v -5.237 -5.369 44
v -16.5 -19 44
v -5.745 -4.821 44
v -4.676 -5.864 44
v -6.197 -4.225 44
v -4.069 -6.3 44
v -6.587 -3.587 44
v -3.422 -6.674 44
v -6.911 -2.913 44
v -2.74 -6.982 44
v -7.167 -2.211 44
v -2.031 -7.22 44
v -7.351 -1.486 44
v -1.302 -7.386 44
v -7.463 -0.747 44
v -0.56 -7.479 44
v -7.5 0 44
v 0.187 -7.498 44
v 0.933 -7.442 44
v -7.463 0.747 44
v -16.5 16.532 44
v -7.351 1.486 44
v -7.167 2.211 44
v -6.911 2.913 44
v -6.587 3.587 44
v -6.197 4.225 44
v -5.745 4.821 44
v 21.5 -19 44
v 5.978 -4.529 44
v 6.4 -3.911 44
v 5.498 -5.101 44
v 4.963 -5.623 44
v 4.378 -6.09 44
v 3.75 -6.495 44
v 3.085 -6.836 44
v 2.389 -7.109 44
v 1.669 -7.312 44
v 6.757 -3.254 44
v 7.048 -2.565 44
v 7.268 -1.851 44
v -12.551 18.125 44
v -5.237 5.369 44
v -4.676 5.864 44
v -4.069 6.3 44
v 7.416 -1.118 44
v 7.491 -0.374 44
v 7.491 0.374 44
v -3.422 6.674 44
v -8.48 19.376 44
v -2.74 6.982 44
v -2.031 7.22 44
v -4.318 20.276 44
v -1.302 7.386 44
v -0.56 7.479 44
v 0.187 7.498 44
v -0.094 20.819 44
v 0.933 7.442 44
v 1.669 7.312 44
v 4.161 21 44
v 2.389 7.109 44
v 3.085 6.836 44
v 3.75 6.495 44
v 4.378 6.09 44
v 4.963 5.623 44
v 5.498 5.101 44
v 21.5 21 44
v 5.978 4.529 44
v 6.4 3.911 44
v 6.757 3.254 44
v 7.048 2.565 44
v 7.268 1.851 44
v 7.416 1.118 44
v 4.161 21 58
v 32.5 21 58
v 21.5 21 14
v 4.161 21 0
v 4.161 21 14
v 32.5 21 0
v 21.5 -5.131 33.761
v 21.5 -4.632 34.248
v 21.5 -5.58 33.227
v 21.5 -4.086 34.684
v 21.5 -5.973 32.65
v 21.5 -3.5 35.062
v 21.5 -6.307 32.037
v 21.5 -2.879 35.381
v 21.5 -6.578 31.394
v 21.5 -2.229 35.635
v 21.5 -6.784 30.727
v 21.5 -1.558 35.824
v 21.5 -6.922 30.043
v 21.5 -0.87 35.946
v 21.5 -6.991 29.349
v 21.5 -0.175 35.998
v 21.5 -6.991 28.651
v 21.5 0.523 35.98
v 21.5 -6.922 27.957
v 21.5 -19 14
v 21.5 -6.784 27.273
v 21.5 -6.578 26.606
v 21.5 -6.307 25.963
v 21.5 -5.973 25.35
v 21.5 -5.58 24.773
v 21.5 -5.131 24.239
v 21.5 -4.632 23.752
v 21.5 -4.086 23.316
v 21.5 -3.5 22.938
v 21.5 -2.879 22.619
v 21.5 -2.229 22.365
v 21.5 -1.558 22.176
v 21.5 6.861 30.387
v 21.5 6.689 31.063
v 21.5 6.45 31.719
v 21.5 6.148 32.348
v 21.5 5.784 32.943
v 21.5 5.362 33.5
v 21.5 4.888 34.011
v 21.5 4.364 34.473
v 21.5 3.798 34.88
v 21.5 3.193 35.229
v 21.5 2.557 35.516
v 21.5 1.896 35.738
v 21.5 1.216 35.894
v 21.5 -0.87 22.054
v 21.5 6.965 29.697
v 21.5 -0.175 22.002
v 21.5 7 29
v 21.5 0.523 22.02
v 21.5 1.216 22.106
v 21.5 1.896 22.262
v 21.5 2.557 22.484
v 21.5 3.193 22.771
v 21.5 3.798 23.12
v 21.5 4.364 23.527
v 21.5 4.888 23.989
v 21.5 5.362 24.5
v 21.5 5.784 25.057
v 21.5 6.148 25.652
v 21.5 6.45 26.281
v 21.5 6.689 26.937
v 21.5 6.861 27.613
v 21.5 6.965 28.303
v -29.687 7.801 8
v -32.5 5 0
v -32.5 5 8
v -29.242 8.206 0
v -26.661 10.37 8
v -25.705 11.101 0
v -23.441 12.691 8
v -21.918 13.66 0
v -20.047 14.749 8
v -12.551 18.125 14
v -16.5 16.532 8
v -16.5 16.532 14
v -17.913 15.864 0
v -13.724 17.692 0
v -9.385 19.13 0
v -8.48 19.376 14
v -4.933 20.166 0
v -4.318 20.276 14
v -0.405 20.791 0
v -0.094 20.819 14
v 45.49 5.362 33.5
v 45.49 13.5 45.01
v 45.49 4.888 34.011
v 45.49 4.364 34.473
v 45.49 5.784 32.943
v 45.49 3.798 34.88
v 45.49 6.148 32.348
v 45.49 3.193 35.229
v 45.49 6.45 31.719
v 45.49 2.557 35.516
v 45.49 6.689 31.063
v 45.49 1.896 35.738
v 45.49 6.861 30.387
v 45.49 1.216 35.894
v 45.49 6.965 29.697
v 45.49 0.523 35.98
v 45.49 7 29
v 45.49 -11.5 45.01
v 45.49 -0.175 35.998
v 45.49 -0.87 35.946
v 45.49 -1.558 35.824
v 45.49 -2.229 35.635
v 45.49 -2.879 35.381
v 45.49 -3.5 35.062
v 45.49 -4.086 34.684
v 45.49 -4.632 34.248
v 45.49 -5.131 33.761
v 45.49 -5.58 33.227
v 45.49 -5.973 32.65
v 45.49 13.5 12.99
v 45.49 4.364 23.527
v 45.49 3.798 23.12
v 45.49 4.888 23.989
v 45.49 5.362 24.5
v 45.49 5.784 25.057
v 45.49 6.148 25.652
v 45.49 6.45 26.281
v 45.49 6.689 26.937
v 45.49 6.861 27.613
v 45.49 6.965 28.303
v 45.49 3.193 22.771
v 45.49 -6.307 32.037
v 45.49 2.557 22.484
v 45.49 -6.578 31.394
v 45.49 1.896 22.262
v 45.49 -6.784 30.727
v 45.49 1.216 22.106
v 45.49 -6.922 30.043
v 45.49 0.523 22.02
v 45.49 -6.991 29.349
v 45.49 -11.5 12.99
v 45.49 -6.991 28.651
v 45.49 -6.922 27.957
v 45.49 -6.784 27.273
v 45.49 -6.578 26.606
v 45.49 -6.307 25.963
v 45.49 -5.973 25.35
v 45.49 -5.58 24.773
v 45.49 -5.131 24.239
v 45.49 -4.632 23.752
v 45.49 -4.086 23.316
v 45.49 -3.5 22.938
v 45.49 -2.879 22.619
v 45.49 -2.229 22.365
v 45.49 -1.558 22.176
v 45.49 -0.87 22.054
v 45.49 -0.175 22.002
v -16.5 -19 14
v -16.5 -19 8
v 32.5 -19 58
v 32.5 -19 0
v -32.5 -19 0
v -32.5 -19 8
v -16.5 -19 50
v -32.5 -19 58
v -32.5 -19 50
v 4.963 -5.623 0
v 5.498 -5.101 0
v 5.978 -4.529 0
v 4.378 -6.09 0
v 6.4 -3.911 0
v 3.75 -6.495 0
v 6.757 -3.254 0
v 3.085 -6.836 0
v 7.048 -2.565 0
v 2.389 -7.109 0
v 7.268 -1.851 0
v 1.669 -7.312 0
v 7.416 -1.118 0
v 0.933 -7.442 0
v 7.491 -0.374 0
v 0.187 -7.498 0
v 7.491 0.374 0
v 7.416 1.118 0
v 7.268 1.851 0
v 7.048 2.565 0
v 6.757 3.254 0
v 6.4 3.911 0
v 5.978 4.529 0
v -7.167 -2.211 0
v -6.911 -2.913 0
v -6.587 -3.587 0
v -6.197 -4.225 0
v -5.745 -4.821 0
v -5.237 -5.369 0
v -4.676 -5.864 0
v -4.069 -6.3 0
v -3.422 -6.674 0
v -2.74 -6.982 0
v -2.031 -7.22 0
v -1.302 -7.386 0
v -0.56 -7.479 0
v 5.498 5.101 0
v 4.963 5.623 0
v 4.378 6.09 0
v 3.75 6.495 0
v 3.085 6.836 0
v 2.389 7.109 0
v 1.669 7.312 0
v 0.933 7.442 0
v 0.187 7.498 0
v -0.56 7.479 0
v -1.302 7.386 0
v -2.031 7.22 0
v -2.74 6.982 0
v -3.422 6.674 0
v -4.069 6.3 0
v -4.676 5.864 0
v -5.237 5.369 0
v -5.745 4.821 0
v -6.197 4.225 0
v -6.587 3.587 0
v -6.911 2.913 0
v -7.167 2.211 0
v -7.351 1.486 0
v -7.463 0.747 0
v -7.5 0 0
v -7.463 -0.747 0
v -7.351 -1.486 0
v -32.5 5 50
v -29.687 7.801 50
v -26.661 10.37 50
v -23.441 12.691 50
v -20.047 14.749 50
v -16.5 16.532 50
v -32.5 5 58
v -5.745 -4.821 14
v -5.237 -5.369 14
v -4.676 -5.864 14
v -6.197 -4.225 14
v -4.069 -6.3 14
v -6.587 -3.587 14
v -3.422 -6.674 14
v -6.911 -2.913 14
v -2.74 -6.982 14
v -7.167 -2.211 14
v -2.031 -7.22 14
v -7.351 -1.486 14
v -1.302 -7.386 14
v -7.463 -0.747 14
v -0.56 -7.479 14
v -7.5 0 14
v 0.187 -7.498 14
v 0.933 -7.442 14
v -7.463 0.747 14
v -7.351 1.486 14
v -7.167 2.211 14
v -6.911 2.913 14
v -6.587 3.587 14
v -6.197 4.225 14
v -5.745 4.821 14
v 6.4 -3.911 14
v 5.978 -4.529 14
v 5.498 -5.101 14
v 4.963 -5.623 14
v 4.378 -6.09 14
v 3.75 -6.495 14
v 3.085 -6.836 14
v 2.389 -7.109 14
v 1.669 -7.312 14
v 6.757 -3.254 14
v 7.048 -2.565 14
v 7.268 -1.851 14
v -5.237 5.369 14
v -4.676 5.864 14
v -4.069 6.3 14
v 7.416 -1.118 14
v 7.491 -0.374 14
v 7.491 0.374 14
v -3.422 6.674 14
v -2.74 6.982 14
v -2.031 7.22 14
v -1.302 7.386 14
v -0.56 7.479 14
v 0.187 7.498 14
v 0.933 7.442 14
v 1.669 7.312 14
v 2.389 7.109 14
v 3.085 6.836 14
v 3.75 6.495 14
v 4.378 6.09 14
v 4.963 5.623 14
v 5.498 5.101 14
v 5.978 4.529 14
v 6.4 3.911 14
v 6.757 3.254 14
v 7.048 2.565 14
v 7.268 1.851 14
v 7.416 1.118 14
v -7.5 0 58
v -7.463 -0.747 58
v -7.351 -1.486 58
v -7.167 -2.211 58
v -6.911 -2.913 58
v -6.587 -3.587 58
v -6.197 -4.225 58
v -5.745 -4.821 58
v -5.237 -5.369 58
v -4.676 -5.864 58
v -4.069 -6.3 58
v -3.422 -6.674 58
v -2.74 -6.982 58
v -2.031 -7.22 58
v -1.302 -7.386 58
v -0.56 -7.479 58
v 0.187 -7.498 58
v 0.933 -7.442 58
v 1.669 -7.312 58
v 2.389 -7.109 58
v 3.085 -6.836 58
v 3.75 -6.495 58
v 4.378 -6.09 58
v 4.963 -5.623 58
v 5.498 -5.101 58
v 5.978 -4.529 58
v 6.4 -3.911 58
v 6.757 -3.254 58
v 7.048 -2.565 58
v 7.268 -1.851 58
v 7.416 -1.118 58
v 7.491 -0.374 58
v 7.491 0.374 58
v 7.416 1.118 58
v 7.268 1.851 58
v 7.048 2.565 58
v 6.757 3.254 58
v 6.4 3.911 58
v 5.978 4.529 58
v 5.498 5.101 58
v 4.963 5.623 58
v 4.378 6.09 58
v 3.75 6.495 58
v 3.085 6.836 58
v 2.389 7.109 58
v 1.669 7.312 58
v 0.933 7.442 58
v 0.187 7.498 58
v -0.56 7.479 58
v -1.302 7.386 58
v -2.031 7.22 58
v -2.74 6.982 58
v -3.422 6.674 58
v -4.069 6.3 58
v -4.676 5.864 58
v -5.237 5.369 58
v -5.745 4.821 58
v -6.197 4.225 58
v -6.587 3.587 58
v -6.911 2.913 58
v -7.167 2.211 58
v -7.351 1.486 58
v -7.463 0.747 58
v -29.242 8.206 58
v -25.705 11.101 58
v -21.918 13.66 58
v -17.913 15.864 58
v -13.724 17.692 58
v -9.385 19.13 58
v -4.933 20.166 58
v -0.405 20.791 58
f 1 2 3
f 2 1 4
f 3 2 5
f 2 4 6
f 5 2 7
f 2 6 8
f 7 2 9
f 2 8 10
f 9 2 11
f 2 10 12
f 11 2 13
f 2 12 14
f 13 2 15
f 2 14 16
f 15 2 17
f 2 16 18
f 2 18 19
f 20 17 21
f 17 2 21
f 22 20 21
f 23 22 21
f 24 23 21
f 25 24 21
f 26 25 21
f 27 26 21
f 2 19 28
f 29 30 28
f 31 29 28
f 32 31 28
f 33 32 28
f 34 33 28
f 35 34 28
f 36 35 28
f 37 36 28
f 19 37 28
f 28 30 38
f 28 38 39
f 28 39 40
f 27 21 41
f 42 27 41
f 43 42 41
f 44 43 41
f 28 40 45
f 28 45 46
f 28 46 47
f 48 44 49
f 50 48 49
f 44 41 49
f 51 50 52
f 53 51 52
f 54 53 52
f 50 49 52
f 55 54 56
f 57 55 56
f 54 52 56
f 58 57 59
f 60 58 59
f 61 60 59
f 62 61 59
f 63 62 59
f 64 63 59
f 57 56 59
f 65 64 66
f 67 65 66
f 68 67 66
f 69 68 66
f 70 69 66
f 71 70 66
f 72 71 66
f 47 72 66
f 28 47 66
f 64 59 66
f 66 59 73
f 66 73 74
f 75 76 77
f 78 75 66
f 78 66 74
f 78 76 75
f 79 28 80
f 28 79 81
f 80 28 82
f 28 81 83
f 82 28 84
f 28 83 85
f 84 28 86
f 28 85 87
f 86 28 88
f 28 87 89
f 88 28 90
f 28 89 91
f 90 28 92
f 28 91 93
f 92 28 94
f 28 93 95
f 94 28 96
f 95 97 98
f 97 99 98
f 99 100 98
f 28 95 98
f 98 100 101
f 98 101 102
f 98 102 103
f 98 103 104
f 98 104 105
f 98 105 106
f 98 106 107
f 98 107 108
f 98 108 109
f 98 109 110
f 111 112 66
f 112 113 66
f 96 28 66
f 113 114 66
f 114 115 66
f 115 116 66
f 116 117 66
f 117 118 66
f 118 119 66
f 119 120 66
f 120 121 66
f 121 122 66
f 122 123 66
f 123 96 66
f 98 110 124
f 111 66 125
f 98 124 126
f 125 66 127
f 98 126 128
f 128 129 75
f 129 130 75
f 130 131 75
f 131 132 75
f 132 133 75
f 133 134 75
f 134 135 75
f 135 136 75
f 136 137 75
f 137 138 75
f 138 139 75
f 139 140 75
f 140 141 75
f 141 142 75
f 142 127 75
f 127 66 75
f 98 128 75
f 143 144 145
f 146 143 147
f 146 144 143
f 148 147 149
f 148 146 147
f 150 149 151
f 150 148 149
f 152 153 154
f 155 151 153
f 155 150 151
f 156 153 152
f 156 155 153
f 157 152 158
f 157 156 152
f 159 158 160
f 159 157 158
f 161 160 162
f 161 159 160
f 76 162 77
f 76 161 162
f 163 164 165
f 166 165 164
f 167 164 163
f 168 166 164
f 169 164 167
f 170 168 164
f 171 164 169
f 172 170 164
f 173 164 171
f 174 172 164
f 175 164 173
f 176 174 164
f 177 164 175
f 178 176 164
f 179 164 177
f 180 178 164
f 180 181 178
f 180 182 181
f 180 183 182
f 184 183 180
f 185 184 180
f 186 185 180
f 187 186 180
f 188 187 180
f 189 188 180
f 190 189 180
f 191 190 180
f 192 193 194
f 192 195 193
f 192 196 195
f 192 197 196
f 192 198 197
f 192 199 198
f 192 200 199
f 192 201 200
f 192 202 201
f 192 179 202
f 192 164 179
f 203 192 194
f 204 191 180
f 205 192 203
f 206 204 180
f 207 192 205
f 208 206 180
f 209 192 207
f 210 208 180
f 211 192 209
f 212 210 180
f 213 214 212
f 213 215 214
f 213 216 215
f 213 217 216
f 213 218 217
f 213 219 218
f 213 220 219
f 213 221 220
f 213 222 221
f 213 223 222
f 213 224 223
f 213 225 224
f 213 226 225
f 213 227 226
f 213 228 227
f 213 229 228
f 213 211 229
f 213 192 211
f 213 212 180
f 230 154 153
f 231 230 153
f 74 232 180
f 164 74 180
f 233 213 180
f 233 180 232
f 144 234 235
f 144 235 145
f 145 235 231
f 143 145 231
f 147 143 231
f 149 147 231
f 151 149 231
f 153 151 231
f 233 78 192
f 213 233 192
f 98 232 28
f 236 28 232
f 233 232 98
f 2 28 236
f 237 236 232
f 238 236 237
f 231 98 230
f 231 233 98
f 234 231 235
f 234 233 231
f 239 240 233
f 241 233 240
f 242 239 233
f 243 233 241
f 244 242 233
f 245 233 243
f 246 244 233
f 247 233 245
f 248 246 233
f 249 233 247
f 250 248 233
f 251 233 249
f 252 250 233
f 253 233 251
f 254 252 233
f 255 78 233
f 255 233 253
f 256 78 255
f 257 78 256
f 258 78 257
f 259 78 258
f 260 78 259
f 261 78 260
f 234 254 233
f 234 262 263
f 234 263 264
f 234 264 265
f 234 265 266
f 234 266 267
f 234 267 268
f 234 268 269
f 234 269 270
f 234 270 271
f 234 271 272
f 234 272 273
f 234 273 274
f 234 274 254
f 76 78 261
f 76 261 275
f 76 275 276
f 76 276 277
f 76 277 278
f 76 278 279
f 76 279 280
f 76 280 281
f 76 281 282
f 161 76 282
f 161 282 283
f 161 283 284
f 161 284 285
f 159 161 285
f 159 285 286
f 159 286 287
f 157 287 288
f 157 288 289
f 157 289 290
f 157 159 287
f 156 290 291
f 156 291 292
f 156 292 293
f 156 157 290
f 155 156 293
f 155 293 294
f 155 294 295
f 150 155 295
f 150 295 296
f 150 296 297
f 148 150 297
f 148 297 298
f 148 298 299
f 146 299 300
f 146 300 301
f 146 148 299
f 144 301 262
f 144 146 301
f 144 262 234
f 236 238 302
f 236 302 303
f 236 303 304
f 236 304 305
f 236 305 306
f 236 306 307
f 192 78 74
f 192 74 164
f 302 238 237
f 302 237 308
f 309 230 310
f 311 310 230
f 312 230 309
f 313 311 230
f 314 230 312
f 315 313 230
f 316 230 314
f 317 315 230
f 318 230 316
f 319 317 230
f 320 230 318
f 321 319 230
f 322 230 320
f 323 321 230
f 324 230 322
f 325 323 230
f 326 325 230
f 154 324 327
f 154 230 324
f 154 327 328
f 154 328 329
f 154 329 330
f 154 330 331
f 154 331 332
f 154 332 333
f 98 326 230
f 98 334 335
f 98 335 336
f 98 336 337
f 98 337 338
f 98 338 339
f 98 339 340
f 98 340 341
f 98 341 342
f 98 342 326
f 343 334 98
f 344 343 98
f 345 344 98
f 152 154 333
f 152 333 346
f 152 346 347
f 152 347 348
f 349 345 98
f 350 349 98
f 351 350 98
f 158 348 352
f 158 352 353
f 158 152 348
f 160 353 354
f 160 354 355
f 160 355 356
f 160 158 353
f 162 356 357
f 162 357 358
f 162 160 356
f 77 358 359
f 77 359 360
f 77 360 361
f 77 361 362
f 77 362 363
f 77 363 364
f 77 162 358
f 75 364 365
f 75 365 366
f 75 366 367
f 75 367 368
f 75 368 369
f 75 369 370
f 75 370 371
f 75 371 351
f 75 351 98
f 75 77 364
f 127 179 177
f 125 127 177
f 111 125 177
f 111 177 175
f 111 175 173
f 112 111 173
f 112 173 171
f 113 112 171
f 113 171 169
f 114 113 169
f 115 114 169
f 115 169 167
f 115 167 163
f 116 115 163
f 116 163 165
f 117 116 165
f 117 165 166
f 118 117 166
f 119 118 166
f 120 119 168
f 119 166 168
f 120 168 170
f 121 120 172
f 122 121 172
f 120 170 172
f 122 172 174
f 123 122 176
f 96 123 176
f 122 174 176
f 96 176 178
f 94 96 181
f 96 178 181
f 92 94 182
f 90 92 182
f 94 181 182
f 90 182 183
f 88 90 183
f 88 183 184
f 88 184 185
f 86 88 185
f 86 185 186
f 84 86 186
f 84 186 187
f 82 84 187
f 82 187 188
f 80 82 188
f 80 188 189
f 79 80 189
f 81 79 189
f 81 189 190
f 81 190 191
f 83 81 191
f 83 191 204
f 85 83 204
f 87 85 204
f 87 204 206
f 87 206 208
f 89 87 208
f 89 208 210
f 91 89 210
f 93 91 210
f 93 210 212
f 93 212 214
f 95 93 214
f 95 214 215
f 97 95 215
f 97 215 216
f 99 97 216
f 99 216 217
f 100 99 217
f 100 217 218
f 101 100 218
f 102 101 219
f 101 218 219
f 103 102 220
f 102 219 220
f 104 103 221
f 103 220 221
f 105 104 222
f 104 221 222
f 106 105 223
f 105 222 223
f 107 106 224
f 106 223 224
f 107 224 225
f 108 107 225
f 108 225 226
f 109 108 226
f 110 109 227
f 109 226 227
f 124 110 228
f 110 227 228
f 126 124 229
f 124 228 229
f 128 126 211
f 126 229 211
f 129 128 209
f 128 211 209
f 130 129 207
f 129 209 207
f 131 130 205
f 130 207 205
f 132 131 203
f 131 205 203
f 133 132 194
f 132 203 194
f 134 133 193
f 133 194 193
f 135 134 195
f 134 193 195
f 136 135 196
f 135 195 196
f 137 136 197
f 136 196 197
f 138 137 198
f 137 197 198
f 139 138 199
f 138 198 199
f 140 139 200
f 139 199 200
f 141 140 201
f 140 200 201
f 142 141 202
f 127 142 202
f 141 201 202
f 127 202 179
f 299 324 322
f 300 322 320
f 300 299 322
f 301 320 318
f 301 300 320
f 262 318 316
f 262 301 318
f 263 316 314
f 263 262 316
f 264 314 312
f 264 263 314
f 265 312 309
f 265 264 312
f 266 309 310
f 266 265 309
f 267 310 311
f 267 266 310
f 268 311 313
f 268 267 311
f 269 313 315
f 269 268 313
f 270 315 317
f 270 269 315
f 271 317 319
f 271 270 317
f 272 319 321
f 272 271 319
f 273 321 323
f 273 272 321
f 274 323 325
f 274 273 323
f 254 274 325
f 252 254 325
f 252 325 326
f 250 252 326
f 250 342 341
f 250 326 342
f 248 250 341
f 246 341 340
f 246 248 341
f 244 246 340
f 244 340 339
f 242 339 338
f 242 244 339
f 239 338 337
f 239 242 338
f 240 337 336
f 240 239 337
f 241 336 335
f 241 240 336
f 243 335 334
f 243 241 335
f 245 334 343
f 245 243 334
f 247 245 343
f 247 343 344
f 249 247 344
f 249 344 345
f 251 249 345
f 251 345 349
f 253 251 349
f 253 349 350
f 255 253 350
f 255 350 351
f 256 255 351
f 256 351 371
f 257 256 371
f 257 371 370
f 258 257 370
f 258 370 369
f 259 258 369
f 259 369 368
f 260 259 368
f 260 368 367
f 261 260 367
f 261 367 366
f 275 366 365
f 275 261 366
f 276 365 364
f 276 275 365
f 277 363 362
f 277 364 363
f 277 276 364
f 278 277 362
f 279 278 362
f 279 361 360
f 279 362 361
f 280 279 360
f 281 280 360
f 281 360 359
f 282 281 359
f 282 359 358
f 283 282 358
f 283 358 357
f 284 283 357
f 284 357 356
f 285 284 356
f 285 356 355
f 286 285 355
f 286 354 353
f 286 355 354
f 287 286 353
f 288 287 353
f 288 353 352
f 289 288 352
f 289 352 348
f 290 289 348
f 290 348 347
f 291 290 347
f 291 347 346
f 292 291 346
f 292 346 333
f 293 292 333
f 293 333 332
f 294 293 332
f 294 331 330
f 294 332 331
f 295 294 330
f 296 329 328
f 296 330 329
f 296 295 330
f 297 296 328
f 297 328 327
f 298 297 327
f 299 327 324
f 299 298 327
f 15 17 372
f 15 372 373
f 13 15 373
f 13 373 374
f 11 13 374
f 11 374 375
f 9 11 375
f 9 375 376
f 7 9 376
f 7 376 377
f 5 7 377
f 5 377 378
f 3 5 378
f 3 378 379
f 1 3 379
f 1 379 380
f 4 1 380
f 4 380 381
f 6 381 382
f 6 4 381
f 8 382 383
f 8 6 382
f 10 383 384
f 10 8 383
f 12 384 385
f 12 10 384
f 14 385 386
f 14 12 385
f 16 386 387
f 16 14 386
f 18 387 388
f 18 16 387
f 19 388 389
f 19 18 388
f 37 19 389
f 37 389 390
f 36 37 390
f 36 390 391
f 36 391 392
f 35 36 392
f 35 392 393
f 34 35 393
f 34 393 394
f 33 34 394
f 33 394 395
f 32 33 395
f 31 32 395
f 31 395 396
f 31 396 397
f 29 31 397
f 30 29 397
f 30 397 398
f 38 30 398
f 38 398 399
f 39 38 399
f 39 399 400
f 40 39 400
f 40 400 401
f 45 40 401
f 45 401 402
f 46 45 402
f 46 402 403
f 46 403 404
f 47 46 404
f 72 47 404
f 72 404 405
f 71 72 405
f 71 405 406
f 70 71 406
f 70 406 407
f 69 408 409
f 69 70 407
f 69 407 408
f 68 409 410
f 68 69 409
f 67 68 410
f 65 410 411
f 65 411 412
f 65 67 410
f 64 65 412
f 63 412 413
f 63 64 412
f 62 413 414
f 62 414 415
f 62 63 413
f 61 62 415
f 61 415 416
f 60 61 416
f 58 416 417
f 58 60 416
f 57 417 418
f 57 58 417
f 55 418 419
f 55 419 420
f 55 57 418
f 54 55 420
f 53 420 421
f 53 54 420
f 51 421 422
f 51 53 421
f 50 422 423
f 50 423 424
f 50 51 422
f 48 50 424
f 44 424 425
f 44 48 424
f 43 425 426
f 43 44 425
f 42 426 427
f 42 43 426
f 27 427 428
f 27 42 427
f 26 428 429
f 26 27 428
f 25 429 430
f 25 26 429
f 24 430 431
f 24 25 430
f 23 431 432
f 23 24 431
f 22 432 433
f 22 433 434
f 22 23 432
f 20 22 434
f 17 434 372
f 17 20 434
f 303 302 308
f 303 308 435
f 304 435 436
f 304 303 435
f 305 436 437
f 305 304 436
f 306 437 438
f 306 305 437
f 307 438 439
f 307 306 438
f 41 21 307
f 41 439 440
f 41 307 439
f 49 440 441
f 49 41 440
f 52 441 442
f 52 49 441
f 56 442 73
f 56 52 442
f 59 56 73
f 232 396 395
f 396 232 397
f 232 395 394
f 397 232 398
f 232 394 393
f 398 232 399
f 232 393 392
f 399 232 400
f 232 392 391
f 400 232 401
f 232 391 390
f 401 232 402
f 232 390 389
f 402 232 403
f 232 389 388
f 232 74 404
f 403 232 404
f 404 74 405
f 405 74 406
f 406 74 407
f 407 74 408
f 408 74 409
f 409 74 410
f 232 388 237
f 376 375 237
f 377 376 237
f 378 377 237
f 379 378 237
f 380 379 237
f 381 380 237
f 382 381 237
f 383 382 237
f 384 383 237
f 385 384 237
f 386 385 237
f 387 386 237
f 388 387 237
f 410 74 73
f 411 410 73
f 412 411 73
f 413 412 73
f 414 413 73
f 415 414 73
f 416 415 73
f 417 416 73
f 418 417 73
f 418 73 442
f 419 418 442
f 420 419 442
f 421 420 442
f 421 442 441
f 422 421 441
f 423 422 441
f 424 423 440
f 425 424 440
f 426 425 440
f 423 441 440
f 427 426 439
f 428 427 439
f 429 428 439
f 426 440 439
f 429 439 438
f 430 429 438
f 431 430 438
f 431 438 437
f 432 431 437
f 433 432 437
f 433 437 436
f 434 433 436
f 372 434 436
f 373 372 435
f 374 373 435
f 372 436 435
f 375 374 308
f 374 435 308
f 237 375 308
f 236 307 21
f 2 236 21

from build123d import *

# Parameters (mm, degrees)
SKETCH1_R               = 7.5
BOSS_EXTRUDE1_DEPTH     = 58
SKETCH2_W               = 38
SKETCH2_H               = 30
CUT_EXTRUDE1_DEPTH      = 84.865217872
CUT_EXTRUDE1_DEPTH_BACK = 84.865217872
SKETCH3_W               = 16
SKETCH3_H               = 6
CUT_EXTRUDE4_DEPTH      = 84.865217872
CUT_EXTRUDE4_DEPTH_BACK = 84.865217872
SKETCH4_R               = 7
CUT_EXTRUDE5_DEPTH      = 100.435906681
CUT_EXTRUDE5_DEPTH_BACK = 100.435906681
CUT_EXTRUDE6_DEPTH      = 84.865217872
CUT_EXTRUDE6_DEPTH_BACK = 84.865217872


with BuildPart() as part:
    # Sketch1 → Boss-Extrude1 (new body)
    with BuildSketch(Plane.XY):
        with BuildLine():
            Line((32.5, -19), (-32.5, -19))
            Line((-32.5, -19), (-32.5, 5))
            ThreePointArc((-32.5, 5), (-15.83939444, 16.82575695), (4.16060556, 21))
            Line((4.16060556, 21), (32.5, 21))
            Line((32.5, 21), (45.490381057, 13.5))
            Line((45.490381057, 13.5), (45.490381057, -11.5))
            Line((45.490381057, -11.5), (32.5, -19))
        make_face()
        with Locations(Location((0, 0, 0), (0, 0, 180))):
            Circle(SKETCH1_R, mode=Mode.SUBTRACT)
    extrude(amount=BOSS_EXTRUDE1_DEPTH)

    # Sketch2 → Cut-Extrude1 (cut, two sides)
    with BuildSketch(Plane(origin=(0, 21, 0), x_dir=(1, 0, 0), z_dir=(0, 1, 0))) as cut_extrude1_sk:
        with Locations((2.5, -29)):
            Rectangle(SKETCH2_W, SKETCH2_H)
    extrude(amount=CUT_EXTRUDE1_DEPTH, mode=Mode.SUBTRACT)
    extrude(cut_extrude1_sk.sketch, amount=-CUT_EXTRUDE1_DEPTH_BACK, mode=Mode.SUBTRACT)

    # Sketch3 → Cut-Extrude4 (cut, two sides)
    with BuildSketch(Plane(origin=(0, 21, 0), x_dir=(1, 0, 0), z_dir=(0, 1, 0))) as cut_extrude4_sk:
        with Locations((-24.5, -47)):
            Rectangle(SKETCH3_W, SKETCH3_H)
        with Locations((-24.5, -11)):
            Rectangle(SKETCH3_W, SKETCH3_H)
    extrude(amount=CUT_EXTRUDE4_DEPTH, mode=Mode.SUBTRACT)
    extrude(cut_extrude4_sk.sketch, amount=-CUT_EXTRUDE4_DEPTH_BACK, mode=Mode.SUBTRACT)


with BuildPart() as body_2:
    # of the pieces the cut leaves, the one that is kept (cut_extrude4_keep)
    add(part.part.solids().sort_by_distance((4.16060556, 21, 0))[0])

    # Sketch4 → Cut-Extrude5 (cut, two sides)
    with BuildSketch(Plane(origin=(45.490381057, 0, 0), x_dir=(0, 0, -1), z_dir=(1, 0, 0))) as cut_extrude5_sk:
        with Locations(Location((-29, 0, 0), (0, 0, 90))):
            Circle(SKETCH4_R)
    extrude(amount=CUT_EXTRUDE5_DEPTH, mode=Mode.SUBTRACT)
    extrude(cut_extrude5_sk.sketch, amount=-CUT_EXTRUDE5_DEPTH_BACK, mode=Mode.SUBTRACT)

    # Sketch6 → Cut-Extrude6 (cut, two sides)
    with BuildSketch(Plane(origin=(0, 21, 0), x_dir=(1, 0, 0), z_dir=(0, 1, 0))) as cut_extrude6_sk:
        Polygon((32.5, 0), (45.490381057, -12.990381057), (45.490381057, 0), align=None)
        Polygon((45.490381057, -45.009618943), (45.490381057, -58), (32.5, -58), align=None)
    extrude(amount=CUT_EXTRUDE6_DEPTH, mode=Mode.SUBTRACT)
    extrude(cut_extrude6_sk.sketch, amount=-CUT_EXTRUDE6_DEPTH_BACK, mode=Mode.SUBTRACT)


solid = body_2.part
